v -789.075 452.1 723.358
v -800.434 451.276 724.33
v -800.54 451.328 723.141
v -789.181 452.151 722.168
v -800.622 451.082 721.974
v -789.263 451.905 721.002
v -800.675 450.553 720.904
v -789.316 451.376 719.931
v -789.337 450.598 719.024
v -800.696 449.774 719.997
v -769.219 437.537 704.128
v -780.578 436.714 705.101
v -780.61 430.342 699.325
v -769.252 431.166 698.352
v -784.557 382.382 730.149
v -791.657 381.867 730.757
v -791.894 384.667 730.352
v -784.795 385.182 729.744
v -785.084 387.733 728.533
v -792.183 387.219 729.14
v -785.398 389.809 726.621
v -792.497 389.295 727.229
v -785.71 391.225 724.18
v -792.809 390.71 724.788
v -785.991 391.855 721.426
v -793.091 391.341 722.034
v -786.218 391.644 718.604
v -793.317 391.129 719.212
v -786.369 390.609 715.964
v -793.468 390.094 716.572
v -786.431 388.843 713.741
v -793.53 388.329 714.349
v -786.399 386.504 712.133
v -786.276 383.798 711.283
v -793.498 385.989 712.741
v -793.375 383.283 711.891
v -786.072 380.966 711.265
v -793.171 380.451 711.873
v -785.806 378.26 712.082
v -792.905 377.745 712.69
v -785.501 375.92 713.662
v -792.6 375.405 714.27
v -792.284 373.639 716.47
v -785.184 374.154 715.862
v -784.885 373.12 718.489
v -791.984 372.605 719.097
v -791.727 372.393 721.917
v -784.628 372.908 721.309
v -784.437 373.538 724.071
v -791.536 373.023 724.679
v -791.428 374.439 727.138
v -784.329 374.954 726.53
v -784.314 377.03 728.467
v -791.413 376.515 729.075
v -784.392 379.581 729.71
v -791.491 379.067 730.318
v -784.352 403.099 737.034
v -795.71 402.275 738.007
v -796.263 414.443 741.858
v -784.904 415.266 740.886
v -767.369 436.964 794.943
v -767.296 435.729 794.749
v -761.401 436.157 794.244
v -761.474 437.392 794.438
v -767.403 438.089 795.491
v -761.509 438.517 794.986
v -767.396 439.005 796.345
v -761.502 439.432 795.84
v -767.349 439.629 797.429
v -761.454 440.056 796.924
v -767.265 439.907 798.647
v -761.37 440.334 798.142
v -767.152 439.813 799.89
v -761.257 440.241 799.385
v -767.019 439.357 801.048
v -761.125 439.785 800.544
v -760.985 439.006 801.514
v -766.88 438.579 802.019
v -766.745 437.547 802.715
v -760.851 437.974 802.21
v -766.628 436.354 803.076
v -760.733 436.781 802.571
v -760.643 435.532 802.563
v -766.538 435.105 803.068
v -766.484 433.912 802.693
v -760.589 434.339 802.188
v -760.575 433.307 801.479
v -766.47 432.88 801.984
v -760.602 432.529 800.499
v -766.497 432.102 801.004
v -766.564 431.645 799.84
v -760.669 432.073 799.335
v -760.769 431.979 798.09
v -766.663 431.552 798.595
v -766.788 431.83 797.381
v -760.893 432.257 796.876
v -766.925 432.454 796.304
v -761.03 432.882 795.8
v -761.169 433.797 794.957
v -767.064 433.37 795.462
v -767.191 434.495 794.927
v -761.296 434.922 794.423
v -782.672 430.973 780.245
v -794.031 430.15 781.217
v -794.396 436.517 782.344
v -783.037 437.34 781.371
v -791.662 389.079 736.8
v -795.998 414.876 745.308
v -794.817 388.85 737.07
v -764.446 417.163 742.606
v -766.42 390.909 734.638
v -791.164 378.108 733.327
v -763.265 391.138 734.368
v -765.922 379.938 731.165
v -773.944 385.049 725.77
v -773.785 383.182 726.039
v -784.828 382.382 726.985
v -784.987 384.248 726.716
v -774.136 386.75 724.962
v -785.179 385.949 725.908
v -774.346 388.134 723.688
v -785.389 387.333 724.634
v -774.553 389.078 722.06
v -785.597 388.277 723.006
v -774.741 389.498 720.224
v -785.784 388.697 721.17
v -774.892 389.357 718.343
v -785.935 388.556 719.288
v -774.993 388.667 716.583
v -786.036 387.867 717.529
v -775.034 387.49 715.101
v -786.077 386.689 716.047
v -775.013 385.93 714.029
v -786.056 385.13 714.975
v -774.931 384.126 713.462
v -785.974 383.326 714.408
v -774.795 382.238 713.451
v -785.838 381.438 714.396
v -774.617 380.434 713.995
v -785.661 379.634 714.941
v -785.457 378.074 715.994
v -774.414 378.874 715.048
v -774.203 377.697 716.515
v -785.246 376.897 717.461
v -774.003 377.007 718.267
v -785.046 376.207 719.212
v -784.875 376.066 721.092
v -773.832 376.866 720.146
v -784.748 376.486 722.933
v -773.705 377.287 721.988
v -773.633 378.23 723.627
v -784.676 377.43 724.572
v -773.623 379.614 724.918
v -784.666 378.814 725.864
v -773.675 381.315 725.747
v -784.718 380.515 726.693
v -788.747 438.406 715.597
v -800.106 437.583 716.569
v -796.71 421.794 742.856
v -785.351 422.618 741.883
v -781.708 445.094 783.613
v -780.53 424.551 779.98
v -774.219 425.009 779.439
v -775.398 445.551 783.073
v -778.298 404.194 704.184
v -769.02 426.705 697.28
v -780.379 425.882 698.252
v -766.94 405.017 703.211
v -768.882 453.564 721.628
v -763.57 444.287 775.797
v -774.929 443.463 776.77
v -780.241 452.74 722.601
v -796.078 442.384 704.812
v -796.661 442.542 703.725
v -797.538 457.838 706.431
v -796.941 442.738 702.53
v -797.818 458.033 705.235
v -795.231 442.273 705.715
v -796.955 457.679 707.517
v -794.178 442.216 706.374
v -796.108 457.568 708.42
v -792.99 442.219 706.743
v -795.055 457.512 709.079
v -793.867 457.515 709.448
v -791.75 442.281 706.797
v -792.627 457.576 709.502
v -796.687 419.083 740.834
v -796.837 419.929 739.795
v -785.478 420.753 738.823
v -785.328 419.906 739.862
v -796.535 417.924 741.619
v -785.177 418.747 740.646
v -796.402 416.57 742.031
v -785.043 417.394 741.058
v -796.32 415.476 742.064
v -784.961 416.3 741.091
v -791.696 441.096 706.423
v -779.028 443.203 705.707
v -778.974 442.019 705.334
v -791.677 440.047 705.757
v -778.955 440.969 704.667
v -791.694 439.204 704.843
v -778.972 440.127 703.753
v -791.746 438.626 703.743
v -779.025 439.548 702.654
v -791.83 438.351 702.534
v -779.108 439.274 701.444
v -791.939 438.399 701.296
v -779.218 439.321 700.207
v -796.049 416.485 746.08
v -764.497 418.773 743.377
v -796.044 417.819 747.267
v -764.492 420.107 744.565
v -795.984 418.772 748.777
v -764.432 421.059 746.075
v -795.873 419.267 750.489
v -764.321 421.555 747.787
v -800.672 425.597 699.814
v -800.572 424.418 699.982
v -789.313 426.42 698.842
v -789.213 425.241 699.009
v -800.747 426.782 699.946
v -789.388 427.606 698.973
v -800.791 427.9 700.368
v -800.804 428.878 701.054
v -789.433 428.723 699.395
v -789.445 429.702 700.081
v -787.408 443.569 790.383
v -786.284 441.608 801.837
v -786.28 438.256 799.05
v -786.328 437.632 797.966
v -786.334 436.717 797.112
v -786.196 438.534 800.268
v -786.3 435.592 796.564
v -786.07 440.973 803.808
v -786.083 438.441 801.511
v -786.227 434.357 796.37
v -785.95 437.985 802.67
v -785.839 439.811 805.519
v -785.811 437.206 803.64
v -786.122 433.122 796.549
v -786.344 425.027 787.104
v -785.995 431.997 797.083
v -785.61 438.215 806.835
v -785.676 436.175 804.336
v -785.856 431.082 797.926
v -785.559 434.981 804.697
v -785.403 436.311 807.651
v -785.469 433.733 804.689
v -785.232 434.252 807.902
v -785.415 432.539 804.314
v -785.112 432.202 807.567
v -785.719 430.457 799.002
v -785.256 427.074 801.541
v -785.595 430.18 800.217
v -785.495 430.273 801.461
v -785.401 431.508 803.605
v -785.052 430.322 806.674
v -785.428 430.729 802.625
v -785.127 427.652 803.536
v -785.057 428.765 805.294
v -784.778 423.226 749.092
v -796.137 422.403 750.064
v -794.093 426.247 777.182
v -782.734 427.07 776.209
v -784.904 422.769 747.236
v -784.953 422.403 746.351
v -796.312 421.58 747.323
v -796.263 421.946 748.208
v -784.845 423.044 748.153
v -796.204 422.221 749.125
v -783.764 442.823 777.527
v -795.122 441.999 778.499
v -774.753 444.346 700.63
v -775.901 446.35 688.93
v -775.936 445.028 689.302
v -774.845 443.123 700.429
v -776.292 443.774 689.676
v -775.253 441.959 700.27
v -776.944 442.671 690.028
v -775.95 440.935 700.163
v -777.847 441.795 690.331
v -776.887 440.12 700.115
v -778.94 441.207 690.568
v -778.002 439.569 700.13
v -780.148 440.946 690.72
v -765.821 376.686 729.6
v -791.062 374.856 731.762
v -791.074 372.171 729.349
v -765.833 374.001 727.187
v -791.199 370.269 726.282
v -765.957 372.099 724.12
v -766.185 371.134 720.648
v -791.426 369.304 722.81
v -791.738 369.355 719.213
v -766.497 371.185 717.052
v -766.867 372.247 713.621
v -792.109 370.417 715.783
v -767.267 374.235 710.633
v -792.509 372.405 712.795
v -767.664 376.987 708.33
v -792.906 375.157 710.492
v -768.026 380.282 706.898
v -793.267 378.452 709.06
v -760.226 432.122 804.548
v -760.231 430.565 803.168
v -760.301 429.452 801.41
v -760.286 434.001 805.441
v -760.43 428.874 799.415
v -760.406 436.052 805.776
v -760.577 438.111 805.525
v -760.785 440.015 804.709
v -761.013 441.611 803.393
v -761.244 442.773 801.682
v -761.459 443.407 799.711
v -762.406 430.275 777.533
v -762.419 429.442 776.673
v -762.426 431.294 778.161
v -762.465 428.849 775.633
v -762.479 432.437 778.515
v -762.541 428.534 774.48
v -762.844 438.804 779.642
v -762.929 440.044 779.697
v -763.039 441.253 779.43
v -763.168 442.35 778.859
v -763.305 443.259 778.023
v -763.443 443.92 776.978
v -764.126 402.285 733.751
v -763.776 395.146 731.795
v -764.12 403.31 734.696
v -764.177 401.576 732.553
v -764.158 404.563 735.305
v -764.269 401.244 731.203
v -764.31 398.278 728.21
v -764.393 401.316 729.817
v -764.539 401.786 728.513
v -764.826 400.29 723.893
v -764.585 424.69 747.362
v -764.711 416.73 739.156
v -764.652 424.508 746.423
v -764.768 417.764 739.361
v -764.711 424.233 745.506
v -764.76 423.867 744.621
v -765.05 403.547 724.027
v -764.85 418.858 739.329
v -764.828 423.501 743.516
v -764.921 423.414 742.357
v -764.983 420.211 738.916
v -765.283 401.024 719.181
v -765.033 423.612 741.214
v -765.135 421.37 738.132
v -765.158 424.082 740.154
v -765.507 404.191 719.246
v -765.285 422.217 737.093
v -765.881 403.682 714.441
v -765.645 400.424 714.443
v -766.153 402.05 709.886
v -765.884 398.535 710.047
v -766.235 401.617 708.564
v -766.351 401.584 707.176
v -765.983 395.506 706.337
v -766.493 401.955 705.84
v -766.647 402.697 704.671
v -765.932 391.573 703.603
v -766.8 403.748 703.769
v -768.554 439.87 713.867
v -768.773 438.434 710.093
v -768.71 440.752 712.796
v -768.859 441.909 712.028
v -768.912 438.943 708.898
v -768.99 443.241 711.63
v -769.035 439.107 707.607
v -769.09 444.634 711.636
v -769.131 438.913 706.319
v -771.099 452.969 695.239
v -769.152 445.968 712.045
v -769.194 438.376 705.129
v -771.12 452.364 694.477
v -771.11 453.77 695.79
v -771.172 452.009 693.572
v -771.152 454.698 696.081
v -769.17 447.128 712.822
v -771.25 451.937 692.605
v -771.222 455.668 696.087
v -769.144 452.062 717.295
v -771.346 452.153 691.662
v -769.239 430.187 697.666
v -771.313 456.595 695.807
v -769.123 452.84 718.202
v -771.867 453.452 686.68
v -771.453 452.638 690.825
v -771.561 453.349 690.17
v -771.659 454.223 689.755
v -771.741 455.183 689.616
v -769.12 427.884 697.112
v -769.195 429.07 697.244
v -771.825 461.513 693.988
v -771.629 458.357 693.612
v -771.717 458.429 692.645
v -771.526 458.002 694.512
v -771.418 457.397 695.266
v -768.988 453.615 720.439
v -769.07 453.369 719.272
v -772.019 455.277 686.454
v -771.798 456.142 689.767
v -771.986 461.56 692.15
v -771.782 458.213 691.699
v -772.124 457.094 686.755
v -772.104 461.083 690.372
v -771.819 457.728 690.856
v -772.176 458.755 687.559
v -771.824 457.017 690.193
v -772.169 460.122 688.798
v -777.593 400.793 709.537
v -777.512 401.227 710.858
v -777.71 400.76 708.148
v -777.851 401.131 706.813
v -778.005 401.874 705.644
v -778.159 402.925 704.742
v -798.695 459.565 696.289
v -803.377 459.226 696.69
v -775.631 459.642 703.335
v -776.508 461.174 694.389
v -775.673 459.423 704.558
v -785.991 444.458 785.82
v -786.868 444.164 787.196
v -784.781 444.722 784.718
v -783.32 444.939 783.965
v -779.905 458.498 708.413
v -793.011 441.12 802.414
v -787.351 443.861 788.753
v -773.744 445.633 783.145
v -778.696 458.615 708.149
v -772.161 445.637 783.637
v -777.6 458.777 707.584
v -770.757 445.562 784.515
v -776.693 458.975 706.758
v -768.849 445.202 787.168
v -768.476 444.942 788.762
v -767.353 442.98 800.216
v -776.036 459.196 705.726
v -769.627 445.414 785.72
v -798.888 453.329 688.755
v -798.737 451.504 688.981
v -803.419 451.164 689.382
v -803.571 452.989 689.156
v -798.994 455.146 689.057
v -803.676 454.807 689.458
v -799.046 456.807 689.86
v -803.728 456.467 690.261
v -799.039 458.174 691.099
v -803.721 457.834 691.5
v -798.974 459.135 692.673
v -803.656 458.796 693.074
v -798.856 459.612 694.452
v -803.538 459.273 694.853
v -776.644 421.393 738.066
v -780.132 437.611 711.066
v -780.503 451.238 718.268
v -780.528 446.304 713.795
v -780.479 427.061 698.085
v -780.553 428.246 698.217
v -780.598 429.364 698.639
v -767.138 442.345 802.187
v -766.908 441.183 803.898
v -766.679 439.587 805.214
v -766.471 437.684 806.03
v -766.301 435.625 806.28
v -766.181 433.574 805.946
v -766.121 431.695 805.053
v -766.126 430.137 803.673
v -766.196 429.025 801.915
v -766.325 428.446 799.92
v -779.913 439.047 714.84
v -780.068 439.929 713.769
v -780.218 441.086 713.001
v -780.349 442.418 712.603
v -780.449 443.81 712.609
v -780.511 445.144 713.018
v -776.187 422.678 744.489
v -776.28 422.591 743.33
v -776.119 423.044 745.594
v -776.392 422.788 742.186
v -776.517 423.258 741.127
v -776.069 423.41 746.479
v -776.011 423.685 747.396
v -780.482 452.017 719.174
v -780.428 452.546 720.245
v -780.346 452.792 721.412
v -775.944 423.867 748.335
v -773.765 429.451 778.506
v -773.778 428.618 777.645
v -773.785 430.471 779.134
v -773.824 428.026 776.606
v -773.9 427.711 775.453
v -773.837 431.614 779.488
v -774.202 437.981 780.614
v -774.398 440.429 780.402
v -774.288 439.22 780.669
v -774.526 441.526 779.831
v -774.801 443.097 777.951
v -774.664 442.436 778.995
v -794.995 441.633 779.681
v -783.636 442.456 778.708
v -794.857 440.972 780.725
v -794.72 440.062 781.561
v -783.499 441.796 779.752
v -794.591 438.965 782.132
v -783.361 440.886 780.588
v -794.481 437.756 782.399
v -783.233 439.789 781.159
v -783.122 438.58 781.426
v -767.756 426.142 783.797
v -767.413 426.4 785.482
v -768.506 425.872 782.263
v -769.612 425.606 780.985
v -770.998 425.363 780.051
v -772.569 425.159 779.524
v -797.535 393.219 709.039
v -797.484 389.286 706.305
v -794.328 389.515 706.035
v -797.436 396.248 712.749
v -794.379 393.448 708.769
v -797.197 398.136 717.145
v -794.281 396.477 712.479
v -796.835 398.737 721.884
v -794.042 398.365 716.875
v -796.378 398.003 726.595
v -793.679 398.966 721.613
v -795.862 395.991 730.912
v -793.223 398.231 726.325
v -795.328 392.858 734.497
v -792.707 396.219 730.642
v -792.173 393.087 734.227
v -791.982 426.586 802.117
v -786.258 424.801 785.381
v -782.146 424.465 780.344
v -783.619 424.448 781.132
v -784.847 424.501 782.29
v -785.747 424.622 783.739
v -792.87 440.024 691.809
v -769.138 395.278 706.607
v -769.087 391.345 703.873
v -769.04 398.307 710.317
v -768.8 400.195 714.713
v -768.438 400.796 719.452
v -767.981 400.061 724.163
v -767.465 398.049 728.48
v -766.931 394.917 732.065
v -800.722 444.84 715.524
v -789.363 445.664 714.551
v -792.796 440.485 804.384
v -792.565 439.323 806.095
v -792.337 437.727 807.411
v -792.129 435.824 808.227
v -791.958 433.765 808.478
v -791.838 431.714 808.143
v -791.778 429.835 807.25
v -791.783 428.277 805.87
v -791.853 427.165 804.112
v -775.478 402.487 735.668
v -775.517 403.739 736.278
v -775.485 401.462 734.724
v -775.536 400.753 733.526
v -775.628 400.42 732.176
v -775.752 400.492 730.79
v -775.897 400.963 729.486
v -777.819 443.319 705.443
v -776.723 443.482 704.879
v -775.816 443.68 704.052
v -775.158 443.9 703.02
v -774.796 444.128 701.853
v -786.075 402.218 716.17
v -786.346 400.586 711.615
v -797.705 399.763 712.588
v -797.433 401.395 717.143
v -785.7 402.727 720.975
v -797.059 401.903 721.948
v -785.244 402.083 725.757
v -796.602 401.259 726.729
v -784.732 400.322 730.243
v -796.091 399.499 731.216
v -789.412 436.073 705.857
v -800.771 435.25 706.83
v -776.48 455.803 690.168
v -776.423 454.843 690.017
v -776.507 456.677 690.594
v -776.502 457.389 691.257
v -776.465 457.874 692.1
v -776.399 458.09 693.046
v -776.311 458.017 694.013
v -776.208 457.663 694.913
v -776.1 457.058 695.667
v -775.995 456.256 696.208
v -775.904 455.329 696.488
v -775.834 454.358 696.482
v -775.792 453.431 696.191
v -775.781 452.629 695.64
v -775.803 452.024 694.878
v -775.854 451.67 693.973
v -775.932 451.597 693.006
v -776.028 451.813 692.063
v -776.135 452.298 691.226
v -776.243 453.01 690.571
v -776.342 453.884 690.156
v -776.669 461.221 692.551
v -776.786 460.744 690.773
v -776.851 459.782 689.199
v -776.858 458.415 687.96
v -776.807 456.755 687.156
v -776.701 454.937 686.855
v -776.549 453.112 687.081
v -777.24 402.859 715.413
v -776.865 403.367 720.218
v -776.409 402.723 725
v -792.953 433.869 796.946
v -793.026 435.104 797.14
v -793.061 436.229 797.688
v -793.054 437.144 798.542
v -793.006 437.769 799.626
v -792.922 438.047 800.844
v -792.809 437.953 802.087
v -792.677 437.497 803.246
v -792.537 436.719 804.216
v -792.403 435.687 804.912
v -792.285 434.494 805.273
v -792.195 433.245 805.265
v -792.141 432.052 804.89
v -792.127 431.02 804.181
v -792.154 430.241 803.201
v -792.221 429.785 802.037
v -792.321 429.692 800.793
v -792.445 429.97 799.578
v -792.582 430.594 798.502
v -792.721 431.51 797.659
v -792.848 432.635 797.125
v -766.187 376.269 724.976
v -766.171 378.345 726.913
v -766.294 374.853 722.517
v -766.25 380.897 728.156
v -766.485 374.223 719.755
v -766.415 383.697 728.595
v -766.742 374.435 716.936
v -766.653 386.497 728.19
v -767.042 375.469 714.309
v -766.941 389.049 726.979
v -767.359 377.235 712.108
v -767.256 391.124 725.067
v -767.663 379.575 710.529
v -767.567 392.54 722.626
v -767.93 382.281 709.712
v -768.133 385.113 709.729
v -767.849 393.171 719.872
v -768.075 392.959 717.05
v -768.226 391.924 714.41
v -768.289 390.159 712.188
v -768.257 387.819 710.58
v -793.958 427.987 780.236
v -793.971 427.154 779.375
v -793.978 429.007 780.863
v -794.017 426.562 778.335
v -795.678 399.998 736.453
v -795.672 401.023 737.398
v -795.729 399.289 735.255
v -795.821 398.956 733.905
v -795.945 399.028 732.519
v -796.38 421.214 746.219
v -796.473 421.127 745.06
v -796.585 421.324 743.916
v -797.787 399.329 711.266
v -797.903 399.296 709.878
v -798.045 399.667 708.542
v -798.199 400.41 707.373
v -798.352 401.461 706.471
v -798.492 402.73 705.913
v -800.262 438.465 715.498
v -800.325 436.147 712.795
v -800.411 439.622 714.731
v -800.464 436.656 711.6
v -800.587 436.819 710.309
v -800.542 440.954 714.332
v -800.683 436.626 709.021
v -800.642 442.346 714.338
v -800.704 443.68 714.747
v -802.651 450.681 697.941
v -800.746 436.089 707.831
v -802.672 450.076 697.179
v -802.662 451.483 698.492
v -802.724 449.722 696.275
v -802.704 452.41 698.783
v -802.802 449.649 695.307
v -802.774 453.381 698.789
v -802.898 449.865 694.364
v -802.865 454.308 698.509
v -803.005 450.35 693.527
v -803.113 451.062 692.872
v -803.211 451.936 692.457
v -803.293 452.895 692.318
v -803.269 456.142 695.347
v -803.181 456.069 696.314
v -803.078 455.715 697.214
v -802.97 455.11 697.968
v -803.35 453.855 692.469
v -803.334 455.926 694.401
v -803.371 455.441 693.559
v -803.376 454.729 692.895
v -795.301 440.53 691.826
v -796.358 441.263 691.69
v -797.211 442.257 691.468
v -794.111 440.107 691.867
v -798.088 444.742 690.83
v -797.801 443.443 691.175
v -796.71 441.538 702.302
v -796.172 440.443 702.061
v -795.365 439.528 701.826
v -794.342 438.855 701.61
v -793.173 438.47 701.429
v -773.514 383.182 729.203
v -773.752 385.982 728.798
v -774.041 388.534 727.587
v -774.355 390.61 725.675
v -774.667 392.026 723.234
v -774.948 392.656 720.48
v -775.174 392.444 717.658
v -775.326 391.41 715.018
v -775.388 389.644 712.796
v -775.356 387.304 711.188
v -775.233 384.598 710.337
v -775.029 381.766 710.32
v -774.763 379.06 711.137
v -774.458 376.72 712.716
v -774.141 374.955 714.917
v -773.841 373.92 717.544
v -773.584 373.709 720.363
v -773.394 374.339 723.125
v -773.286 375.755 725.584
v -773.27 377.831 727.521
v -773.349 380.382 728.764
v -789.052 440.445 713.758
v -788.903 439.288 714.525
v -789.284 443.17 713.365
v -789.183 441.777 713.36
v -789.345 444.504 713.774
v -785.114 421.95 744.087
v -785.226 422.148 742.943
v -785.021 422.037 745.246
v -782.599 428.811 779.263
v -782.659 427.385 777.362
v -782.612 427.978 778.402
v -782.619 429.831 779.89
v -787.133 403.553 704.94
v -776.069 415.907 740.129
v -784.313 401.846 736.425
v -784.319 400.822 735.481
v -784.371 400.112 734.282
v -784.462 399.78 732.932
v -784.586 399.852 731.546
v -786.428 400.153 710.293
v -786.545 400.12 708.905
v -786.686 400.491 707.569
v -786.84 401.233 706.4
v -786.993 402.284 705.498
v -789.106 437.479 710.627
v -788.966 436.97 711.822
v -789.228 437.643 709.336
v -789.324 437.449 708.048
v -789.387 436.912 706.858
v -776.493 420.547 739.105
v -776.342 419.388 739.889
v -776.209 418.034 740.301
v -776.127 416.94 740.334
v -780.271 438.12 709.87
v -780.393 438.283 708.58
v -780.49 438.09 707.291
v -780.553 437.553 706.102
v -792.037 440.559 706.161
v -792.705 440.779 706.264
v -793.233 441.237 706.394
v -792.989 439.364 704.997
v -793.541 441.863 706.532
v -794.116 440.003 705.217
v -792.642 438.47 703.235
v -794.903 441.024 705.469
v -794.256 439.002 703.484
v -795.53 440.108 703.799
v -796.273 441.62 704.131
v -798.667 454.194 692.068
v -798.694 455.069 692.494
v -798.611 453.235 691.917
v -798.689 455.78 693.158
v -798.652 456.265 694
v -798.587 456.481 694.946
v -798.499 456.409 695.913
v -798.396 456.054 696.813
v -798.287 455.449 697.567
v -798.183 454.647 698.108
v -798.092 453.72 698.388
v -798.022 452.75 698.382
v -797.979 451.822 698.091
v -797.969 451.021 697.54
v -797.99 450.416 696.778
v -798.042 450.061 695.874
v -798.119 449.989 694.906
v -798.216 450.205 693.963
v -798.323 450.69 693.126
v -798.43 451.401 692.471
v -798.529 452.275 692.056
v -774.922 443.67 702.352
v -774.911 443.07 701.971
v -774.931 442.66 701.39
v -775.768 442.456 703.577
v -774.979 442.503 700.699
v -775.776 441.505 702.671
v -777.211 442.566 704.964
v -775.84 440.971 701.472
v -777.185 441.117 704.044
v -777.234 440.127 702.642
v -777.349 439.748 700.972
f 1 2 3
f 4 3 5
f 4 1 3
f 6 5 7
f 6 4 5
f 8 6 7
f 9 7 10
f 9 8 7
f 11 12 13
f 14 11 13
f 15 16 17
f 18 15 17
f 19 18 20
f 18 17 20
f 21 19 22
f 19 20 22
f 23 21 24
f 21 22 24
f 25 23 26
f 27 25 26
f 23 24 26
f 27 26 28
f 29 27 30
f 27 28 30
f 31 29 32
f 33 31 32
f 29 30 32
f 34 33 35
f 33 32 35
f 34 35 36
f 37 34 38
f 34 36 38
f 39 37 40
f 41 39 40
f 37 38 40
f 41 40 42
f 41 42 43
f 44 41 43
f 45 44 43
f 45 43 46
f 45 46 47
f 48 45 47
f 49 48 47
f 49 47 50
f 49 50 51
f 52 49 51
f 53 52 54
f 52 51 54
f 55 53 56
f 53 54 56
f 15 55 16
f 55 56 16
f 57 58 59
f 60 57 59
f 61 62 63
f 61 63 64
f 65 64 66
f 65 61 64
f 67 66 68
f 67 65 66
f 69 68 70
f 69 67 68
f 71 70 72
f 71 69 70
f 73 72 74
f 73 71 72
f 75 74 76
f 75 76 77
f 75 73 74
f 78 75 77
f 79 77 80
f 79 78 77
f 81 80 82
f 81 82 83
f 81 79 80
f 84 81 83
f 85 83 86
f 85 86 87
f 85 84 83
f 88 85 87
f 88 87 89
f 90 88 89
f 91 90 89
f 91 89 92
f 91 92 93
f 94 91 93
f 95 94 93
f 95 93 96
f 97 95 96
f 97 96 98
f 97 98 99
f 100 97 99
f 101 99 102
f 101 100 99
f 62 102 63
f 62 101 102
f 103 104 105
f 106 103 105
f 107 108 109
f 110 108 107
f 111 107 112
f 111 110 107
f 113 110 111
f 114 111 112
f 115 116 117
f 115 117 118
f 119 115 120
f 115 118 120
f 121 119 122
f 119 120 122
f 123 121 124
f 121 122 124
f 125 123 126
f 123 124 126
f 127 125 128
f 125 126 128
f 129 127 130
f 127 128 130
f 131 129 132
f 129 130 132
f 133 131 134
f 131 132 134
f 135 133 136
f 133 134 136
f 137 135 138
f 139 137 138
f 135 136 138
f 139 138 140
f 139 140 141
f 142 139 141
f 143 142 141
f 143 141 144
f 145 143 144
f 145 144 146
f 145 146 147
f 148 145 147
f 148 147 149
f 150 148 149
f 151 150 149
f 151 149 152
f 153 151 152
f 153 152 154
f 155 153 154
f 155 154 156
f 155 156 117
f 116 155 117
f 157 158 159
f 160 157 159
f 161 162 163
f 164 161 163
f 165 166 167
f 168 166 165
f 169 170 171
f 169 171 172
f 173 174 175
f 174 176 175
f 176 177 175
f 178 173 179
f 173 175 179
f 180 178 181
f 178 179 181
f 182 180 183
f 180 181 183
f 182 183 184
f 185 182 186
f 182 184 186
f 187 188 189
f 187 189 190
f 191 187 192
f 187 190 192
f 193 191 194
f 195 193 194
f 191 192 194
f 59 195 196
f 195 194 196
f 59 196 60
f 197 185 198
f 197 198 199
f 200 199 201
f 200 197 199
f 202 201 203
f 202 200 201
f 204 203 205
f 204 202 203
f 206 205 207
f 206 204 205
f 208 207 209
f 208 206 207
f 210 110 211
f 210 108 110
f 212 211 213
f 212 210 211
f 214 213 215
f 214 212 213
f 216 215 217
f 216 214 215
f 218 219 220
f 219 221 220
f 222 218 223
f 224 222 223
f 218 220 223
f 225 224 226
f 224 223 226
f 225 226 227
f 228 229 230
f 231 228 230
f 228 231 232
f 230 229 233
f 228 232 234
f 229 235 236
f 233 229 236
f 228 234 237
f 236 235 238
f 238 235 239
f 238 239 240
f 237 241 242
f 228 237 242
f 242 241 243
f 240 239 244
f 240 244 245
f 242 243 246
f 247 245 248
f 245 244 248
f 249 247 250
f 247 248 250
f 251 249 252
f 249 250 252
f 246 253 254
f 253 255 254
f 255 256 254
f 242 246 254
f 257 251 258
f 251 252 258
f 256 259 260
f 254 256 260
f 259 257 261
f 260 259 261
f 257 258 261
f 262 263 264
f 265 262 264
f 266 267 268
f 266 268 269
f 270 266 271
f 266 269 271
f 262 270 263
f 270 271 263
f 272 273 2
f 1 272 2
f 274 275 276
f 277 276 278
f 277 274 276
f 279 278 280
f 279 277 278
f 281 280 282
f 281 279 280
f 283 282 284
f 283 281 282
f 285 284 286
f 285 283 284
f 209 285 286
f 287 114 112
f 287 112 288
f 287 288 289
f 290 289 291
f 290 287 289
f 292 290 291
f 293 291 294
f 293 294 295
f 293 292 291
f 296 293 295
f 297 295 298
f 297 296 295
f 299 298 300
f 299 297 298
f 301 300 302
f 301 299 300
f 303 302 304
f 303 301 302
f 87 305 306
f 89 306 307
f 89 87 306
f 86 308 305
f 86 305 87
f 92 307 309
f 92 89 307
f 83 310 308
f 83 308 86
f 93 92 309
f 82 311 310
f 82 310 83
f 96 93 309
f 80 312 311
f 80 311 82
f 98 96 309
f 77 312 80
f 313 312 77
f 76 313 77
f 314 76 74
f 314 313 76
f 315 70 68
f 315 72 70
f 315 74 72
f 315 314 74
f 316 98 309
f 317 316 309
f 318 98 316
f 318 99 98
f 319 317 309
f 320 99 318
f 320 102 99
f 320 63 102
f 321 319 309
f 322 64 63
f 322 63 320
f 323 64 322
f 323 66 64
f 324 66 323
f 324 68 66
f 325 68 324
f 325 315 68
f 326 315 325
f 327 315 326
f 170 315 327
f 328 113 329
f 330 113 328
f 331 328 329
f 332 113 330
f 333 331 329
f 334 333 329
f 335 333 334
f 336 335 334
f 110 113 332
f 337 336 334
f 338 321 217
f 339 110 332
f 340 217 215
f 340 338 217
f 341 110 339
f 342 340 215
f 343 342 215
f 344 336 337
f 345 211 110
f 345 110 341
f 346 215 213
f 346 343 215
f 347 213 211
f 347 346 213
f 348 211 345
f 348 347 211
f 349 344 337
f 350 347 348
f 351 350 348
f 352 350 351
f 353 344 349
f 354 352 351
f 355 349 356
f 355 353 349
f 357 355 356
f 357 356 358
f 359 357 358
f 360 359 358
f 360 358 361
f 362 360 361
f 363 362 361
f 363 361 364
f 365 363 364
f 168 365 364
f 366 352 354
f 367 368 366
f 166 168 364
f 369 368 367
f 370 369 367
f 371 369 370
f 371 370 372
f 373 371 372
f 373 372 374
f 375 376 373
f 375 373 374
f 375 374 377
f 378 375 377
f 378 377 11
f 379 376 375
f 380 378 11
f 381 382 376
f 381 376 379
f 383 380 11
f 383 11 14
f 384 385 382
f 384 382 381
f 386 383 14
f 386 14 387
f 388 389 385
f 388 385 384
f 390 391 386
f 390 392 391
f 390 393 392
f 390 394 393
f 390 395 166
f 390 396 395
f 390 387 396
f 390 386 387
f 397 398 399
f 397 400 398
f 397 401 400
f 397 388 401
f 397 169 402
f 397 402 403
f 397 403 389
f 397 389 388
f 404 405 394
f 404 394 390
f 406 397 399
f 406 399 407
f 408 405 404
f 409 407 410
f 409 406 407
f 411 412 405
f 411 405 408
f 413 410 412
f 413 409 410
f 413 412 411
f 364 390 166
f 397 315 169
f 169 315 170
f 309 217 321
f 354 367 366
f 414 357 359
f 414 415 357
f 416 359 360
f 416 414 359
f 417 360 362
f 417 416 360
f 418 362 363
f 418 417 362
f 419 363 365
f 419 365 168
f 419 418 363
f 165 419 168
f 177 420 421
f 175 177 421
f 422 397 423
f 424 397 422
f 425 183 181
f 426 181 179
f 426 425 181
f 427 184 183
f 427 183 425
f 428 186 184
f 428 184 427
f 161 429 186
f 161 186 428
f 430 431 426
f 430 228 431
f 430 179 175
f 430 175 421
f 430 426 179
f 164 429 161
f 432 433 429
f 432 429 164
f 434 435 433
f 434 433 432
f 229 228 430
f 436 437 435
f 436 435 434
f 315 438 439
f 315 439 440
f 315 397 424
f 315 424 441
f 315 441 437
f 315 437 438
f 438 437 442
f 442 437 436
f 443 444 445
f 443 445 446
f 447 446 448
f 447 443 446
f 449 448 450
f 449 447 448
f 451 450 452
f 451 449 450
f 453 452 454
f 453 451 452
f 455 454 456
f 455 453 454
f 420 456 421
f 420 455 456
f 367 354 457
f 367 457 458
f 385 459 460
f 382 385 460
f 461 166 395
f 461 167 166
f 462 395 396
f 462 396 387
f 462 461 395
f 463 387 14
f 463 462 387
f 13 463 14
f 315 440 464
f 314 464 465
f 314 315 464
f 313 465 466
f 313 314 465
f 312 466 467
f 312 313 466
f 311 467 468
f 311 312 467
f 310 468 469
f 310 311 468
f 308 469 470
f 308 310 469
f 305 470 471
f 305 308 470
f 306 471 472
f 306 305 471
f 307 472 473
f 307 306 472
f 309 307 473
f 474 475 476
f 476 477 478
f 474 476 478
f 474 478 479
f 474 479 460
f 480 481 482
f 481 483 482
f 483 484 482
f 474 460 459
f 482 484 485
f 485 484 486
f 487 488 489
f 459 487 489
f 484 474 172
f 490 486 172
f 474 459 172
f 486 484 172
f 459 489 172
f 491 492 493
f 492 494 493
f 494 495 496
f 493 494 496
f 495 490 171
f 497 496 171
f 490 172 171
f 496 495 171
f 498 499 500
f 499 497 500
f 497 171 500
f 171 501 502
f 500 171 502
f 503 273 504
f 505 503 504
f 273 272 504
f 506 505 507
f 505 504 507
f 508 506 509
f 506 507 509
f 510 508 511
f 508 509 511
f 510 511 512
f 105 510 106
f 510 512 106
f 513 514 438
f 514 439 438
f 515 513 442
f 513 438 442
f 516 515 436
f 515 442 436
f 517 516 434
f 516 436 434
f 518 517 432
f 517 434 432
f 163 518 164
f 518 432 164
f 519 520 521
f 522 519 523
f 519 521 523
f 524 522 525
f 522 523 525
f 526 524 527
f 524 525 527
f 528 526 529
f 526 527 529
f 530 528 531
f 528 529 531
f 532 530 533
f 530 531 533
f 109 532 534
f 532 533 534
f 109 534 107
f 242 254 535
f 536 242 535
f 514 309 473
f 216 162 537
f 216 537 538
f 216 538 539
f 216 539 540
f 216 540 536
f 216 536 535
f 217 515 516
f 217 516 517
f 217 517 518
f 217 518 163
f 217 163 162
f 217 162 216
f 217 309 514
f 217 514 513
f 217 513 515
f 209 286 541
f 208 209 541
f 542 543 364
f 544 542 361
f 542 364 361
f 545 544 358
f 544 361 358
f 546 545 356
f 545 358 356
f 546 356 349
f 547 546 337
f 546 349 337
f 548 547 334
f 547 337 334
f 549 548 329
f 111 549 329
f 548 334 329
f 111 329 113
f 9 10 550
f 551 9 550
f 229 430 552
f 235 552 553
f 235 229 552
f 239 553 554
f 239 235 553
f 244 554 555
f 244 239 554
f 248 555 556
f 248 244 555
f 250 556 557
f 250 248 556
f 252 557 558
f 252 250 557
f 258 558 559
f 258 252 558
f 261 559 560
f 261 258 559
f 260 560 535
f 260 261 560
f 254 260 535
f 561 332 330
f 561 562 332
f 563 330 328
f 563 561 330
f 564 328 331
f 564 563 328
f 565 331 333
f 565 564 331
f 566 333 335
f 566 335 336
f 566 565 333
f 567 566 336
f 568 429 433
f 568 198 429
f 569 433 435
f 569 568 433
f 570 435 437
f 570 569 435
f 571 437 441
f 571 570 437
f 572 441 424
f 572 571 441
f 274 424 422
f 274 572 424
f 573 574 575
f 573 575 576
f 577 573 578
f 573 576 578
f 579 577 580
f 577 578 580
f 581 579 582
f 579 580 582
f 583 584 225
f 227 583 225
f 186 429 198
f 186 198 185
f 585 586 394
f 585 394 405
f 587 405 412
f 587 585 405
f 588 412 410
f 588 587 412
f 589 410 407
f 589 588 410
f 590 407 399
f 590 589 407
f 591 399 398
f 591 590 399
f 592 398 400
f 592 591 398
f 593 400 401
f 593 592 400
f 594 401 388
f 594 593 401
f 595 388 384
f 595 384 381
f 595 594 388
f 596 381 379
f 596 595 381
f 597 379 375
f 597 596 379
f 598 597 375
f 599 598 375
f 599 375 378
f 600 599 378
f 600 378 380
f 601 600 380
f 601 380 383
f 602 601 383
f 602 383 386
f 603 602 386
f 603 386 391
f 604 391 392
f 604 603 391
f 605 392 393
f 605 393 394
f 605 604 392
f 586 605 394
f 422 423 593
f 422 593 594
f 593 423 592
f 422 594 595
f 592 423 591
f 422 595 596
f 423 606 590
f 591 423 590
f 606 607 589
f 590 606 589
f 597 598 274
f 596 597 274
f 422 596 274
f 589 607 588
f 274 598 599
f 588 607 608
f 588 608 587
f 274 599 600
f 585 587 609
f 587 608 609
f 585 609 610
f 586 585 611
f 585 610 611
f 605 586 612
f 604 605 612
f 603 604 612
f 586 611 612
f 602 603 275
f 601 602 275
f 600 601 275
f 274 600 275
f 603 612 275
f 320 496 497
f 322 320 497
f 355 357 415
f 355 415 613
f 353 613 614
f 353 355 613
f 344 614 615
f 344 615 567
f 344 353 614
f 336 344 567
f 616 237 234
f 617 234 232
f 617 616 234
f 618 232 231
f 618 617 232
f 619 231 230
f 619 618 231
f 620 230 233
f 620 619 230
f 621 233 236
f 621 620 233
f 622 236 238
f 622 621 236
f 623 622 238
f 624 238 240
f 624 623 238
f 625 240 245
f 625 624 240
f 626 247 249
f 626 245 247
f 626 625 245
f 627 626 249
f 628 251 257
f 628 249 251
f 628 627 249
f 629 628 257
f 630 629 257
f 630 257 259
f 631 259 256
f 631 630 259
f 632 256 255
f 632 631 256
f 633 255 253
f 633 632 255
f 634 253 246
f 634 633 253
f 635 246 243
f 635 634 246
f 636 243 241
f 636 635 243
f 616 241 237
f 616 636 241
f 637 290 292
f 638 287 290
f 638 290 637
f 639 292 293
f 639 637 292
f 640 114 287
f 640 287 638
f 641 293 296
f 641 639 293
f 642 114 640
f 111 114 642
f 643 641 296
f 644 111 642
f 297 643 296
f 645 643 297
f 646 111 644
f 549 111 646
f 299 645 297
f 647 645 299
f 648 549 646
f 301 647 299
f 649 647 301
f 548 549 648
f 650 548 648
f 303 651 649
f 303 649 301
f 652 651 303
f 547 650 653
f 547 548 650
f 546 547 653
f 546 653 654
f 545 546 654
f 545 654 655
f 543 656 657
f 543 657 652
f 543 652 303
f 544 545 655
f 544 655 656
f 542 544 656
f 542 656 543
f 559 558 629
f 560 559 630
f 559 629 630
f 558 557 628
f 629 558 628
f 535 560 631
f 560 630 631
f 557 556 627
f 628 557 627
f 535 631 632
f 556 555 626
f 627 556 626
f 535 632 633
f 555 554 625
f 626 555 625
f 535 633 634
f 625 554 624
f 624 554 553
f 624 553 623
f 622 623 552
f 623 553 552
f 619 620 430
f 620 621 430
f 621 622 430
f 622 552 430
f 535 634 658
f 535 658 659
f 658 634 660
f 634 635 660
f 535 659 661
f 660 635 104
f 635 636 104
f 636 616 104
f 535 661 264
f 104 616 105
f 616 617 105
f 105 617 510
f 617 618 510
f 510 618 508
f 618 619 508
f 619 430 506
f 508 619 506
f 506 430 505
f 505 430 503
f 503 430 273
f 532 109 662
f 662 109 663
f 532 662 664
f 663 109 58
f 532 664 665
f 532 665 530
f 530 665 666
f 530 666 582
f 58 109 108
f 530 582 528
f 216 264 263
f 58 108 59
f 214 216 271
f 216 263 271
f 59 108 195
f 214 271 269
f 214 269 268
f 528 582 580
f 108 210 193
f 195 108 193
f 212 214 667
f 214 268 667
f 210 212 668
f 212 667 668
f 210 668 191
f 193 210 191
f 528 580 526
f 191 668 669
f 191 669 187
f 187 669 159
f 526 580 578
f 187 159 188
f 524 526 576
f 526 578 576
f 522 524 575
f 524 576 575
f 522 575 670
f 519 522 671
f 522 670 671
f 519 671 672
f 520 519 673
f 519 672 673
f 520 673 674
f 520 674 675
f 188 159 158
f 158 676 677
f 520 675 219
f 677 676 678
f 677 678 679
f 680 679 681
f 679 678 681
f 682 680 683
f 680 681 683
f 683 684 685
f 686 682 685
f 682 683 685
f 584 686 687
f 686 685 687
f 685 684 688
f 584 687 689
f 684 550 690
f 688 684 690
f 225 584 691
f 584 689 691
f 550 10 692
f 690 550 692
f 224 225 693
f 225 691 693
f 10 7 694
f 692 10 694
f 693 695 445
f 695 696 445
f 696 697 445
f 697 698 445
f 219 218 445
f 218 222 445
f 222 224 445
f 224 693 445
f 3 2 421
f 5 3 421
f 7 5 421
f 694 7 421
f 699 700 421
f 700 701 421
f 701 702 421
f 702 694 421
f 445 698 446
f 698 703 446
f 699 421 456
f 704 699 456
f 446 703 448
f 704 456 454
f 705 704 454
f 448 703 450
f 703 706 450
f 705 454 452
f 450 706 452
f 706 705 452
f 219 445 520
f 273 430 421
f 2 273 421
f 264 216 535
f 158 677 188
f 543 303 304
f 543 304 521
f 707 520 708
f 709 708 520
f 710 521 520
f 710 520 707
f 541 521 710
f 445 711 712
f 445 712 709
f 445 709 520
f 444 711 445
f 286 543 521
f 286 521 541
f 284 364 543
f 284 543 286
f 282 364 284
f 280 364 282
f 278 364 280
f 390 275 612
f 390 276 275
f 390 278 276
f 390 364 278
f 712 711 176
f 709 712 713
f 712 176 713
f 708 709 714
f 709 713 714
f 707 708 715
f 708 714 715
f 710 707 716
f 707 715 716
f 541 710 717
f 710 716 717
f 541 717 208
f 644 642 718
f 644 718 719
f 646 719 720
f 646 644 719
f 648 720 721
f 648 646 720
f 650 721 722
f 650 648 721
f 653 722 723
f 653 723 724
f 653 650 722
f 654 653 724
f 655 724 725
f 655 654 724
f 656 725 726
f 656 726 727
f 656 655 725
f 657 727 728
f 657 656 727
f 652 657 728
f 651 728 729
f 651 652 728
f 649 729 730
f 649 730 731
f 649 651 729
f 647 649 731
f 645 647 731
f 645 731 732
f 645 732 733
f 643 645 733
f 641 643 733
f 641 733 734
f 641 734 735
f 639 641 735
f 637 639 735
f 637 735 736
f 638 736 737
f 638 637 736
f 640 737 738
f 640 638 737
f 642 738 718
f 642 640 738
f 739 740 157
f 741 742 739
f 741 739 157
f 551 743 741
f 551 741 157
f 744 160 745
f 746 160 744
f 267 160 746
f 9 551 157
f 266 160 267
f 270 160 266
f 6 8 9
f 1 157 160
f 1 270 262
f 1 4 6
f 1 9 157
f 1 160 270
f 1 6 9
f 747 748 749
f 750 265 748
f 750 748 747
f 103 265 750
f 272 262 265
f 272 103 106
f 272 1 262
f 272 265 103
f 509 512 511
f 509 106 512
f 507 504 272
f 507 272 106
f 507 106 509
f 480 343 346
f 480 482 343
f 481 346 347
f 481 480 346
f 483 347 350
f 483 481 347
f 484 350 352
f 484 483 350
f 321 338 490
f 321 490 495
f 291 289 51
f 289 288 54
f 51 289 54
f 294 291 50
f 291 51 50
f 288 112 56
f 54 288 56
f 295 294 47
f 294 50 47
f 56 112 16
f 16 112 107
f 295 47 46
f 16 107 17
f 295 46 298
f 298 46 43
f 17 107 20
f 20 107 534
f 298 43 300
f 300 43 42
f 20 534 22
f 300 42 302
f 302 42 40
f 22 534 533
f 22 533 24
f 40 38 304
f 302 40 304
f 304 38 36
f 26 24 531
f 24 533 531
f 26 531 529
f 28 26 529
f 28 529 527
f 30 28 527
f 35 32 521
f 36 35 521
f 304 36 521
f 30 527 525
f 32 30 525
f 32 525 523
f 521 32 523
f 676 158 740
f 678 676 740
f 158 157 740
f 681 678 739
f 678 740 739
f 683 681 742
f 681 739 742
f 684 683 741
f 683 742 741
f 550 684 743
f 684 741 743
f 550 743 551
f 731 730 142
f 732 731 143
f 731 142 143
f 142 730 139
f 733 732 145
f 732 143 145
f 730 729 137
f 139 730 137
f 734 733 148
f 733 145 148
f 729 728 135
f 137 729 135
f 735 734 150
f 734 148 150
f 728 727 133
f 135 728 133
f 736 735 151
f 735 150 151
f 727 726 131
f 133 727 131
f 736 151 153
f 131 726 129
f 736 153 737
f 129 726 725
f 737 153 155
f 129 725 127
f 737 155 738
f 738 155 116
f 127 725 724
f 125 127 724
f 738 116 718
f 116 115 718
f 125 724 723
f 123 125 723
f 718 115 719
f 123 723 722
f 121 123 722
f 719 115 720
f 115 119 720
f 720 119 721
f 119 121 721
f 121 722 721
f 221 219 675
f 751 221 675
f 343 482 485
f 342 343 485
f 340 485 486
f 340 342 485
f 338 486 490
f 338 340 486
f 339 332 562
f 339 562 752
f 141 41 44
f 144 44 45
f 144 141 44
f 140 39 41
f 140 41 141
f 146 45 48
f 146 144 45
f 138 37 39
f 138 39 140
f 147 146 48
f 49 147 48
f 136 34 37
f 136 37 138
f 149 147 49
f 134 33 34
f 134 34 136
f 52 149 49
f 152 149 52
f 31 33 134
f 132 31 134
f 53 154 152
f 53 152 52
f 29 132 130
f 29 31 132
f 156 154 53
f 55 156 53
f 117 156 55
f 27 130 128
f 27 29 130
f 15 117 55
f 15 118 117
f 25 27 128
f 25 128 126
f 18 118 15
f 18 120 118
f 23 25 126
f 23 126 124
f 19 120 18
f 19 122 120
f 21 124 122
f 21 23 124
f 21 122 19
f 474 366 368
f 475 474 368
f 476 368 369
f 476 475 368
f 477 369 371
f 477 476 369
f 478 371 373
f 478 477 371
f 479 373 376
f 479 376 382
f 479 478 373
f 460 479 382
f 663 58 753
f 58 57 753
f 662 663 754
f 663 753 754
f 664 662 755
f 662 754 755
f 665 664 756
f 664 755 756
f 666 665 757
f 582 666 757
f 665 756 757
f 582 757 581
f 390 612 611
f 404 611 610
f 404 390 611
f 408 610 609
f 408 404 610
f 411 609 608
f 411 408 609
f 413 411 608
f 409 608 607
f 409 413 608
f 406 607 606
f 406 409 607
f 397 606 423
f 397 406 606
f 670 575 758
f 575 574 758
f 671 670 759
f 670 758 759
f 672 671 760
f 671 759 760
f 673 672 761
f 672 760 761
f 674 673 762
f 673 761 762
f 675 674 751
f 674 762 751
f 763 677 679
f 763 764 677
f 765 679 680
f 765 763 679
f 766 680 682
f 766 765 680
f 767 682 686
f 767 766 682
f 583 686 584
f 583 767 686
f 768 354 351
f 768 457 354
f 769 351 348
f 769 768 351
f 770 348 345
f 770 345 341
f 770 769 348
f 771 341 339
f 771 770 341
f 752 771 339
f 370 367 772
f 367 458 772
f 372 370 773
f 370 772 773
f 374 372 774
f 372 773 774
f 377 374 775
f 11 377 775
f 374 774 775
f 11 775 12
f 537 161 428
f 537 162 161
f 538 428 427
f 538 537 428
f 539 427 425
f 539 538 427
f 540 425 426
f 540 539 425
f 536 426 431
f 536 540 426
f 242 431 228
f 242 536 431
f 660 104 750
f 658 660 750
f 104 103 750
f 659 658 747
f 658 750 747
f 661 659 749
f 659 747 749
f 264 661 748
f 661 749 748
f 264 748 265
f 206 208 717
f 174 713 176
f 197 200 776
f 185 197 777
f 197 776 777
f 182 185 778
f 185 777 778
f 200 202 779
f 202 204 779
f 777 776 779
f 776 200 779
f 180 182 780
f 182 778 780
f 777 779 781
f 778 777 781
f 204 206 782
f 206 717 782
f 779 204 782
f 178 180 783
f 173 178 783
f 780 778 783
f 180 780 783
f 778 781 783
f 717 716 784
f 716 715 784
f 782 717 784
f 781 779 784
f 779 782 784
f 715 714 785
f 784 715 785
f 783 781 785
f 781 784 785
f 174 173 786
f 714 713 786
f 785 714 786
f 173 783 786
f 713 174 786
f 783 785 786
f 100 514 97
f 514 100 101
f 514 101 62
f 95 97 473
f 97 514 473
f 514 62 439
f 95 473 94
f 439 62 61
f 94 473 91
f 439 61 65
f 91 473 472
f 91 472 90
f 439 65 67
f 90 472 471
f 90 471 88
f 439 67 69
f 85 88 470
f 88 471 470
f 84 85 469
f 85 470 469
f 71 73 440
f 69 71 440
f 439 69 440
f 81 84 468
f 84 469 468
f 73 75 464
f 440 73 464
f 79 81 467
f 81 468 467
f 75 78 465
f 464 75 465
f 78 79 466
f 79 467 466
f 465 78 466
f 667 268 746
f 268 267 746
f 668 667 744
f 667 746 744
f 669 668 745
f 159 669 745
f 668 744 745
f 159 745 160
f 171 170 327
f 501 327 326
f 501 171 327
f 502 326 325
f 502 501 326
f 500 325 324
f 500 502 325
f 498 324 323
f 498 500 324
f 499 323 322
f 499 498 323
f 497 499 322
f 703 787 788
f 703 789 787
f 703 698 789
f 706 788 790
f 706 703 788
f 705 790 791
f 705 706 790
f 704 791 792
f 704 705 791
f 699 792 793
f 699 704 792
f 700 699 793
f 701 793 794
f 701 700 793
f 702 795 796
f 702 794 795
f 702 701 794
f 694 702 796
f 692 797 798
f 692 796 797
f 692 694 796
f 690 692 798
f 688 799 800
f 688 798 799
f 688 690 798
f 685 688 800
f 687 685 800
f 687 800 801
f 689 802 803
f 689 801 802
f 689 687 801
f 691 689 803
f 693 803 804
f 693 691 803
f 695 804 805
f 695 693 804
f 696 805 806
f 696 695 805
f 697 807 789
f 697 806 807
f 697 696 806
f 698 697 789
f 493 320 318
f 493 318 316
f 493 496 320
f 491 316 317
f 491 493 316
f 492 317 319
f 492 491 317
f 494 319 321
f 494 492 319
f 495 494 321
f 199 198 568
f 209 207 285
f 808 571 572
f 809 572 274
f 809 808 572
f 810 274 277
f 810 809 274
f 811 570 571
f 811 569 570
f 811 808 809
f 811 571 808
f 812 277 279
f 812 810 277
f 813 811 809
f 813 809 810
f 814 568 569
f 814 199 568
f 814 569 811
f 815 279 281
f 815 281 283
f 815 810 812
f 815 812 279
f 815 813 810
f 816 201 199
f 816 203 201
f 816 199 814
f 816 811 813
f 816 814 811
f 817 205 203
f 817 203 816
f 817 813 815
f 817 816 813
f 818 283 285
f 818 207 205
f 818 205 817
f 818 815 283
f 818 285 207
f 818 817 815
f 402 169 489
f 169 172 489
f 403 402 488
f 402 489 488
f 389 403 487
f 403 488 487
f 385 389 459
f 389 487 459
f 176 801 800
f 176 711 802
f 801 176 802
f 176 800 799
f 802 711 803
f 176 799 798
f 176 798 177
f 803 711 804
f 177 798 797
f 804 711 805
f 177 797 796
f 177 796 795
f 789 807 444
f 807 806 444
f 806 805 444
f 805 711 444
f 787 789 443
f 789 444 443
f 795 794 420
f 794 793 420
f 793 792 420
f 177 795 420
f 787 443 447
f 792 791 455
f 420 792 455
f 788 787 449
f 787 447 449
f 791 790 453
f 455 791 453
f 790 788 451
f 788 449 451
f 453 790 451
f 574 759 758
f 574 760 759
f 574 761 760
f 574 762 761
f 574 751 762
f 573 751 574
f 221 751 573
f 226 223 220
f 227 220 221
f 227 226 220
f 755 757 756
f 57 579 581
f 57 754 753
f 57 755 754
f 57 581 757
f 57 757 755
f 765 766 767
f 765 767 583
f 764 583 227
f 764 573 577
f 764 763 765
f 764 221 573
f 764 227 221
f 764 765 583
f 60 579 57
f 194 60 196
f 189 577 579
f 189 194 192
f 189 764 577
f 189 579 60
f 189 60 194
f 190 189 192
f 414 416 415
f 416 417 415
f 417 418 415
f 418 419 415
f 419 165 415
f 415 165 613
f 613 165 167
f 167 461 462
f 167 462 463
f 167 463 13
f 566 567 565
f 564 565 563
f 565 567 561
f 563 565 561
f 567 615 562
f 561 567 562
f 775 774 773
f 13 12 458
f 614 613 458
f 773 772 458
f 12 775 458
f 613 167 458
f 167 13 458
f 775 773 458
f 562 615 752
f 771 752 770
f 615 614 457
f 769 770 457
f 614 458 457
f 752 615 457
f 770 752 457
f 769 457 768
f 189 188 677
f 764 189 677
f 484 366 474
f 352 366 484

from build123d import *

# Parameters (mm, degrees)
SKETCH1_R               = 3.263900000000121
SKETCH1_R_2             = 4.199999999999976
BOSS_EXTRUDE1_DEPTH     = 15.875
FILLET7_R               = 6.35
CUT_EXTRUDE6_DEPTH      = 25.4
FILLET8_R               = 6.35
CUT_EXTRUDE8_DEPTH      = 20.32
CUT_EXTRUDE9_DEPTH      = 906.5663752758251
CUT_EXTRUDE9_DEPTH_BACK = 3.175
CUT_EXTRUDE10_DEPTH     = 11.43
SKETCH29_R              = 6.349999999999941
CUT_EXTRUDE11_DEPTH     = 906.4543212392226
SKETCH30_R              = 9.525000000000018
CUT_EXTRUDE12_DEPTH     = 7.14375
FILLET10_R              = 4.7625
FILLET10_OF_MIRROR9_R   = 4.7625
SKETCH33_R              = 17.144999999999648
CUT_EXTRUDE14_DEPTH     = 3.175
FILLET11_R              = 4.7625


with BuildPart() as part:
    # Sketch1 → Boss-Extrude1 (new, symmetric)
    with BuildSketch(Plane(origin=(-803.6566332789141, -58.26345281012812, 68.82567852426239), x_dir=(-0.08515417095162939, -0.00241614660156225, -0.9963648575723355), z_dir=(0.9937636896807375, 0.07204582335356381, -0.08510657089457987))):
        with BuildLine():
            ThreePointArc((-664.2038450226969, 436.8184776127322), (-651.8745198787159, 427.9178662715624), (-639.8468613838354, 437.2220896073974))
            Line((-639.8468613838348, 437.2220896073972), (-619.5515204929051, 510.40226291213133))
            ThreePointArc((-619.5515204929051, 510.40226291213133), (-620.9838530756886, 516.4455246988489), (-626.8562553144544, 518.4672768094307))
            Line((-626.8562553144544, 518.4672768094307), (-733.0342996841451, 500.0570320892499))
            ThreePointArc((-733.0342996841451, 500.05703208924996), (-739.1483230926673, 492.6676503574812), (-732.7916358037484, 485.48595339028384))
            Line((-732.7916358037484, 485.4859533902838), (-677.0205822251494, 477.71877799538424))
            Line((-677.0205822251494, 477.71877799538424), (-664.2038450226976, 436.81847761273195))
        make_face()
        with Locations(Location((-625.7562257117465, 512.1230378414245, 0), (0, 0, 0.138795824))):
            Circle(SKETCH1_R, mode=Mode.SUBTRACT)
        with Locations(Location((-731.7743456050367, 492.79045512904787, 0), (0, 0, 0.138795824))):
            Circle(SKETCH1_R_2, mode=Mode.SUBTRACT)
    extrude(amount=BOSS_EXTRUDE1_DEPTH, both=True)

    # Fillet7
    fillet7_edges = [part.edges().sort_by_distance(p)[0] for p in [
        (-780.3962698306742, 419.8482713749311, 745.1689599242694),
    ]]
    fillet(fillet7_edges, radius=FILLET7_R)

    # Sketch23 → Cut-Extrude6 (cut)
    with BuildSketch(Plane(origin=(61.972947811989165, -108.2363846344534, 632.0133130126799), x_dir=(0.9953619214294605, 0.016238085990304504, -0.09482072522199067), z_dir=(0.09620106739496219, -0.16801614414720037, 0.9810789621319872))):
        Polygon((-851.4974580179244, 570.6197226277428), (-849.4828619685262, 535.112578894877), (-830.4634507696352, 536.1916978167321), (-832.4780468190336, 571.698841549598), align=None)
    extrude(amount=-CUT_EXTRUDE6_DEPTH, mode=Mode.SUBTRACT)

    # Fillet8
    fillet8_edges = [part.edges().sort_by_distance(p)[0] for p in [
        (-768.4981336258412, 435.7374633830816, 780.7155057686616),
        (-787.4293319142591, 434.3649904481962, 782.3367859442033),
    ]]
    fillet(fillet8_edges, radius=FILLET8_R)

    # Sketch26 → Cut-Extrude8 (cut)
    with BuildSketch(Plane(origin=(50.277187193507835, -87.80961957666034, 512.7374567291475), x_dir=(-0.9953619214296225, -0.01623864853432569, 0.09482062888268945), z_dir=(-0.0962010673949623, 0.16801614414720273, -0.9810789621319869))):
        Polygon((831.6096354550859, 577.9339524783938), (830.1087716603103, 551.4810443146557), (852.3995223072293, 550.2163296603253), (853.9003861020049, 576.6692378240637), align=None)
    extrude(amount=-CUT_EXTRUDE8_DEPTH, mode=Mode.SUBTRACT)

    # Sketch27 → Cut-Extrude9 (cut, two sides: drawn at the far end of the back side and taken through both)
    with BuildSketch(Plane(origin=(-819.4326318525958, -59.40718025586634, 70.17674533721406), x_dir=(0.08488379068765259, 0.006153900220914947, 0.9963718540738522), z_dir=(-0.9937636896807374, -0.07204582335356426, 0.08510657089458012)).offset(-CUT_EXTRUDE9_DEPTH_BACK)):
        with BuildLine():
            Line((519.6219025840122, 211.91880941976535), (638.4443725730704, 445.9315686732567))
            ThreePointArc((638.4443725730704, 445.9315686732567), (654.0798834896251, 455.31078922151056), (669.3214837157453, 445.3041613048935))
            Line((669.3214837157453, 445.3041613048935), (778.5397566596026, 206.65772885116039))
            Line((778.5397566596026, 206.65772885116039), (767.8761958936219, -318.1367946937436))
            Line((767.8761958936219, -318.1367946937436), (508.95834181803144, -312.87571412513864))
            Line((508.95834181803144, -312.87571412513864), (519.6219025840122, 211.91880941976535))
        make_face()
    extrude(amount=CUT_EXTRUDE9_DEPTH + CUT_EXTRUDE9_DEPTH_BACK, mode=Mode.SUBTRACT)

    # Sketch28 → Cut-Extrude10 (cut)
    with BuildSketch(Plane(origin=(-819.4326318525959, -59.40718025586635, 70.17674533721406), x_dir=(0.08488379068765257, 0.006153900220914946, 0.9963718540738522), z_dir=(-0.9937636896807375, -0.07204582335356424, 0.08510657089458012))):
        with BuildLine():
            Line((641.610435680991, 494.9044603779857), (631.4071387526498, 483.7236998843152))
            Line((631.4071387526498, 483.7236998843152), (639.8115098751724, 452.97250675062605))
            ThreePointArc((639.8115098751724, 452.97250675062605), (654.1443845784224, 458.48513397429696), (668.241493429274, 452.3948237840471))
            Line((668.2414934292741, 452.39482378404716), (674.5635114397776, 472.307585723845))
            ThreePointArc((674.5635114397776, 472.307585723845), (674.9689897543286, 473.36298990652836), (675.4966669350005, 474.3629136263164))
            Line((675.4966669350005, 474.3629136263164), (641.6104356809909, 494.90446037798574))
        make_face()
        with BuildLine():
            Line((653.9539402363619, 508.43045781346063), (643.7918856391113, 497.29489061656125))
            Line((643.7918856391113, 497.2948906165613), (677.6083716229516, 476.79562285771186))
            ThreePointArc((677.6083716229516, 476.79562285771186), (679.842443438827, 478.15968717889757), (682.3634605019174, 478.8641169613652))
            Line((682.3634605019174, 478.8641169613652), (713.0233309253331, 483.01701779228154))
            Line((713.0233309253331, 483.0170177922816), (715.5913760089414, 497.50503494976147))
            Line((715.5913760089414, 497.50503494976147), (653.9539402363619, 508.4304578134607))
        make_face()
    cut_extrude10 = extrude(amount=-CUT_EXTRUDE10_DEPTH, mode=Mode.SUBTRACT)

    # Sketch29 → Cut-Extrude11 (cut, through all)
    with BuildSketch(Plane(origin=(-816.2774321378597, -59.1784347667188, 69.90653197462377), x_dir=(0.08488379068765259, 0.006153900220914947, 0.9963718540738522), z_dir=(-0.9937636896807374, -0.07204582335356423, 0.08510657089458012))):
        with Locations(Location((653.7315776101187, 438.16932755646275, 0), (0, 0, 359.646486586))):
            Circle(SKETCH29_R)
    extrude(amount=-CUT_EXTRUDE11_DEPTH, mode=Mode.SUBTRACT)

    # Sketch30 → Cut-Extrude12 (cut)
    with BuildSketch(Plane(origin=(-816.2774321378599, -59.178434766718816, 69.90653197462377), x_dir=(0.08488379068765257, 0.006153900220914946, 0.9963718540738522), z_dir=(-0.9937636896807375, -0.07204582335356424, 0.08510657089458012))):
        with Locations(Location((653.7315776101187, 438.16932755646275, 0), (0, 0, 359.646486586))):
            Circle(SKETCH30_R)
    cut_extrude12 = extrude(amount=-CUT_EXTRUDE12_DEPTH, mode=Mode.SUBTRACT)

    # Fillet10
    fillet10_edges = [part.edges().sort_by_distance(p)[0] for p in [
        (-788.1552248280682, 427.1450787260482, 780.1267395165396),
        (-788.9848414044336, 441.61097464981503, 782.6854673578397),
        (-795.0068579123044, 452.1284878234392, 721.2716611967566),
        (-795.0642591647301, 440.95953350372866, 711.1464760164944),
        (-790.7115231509628, 420.72202917254344, 744.8402708544758),
        (-789.7422422016995, 396.3274603010962, 735.5073770617572),
        (-792.1972581719219, 396.7286758070525, 707.180541636668),
        (-790.7148679020396, 418.2826927308667, 742.7362277392854),
        (-795.0765812752346, 438.5619361773402, 708.9729406771527),
        (-795.1342154885674, 427.347653060428, 698.8066627989953),
    ]]
    fillet(fillet10_edges, radius=FILLET10_R)

    # Mirror9: Cut-Extrude10, Cut-Extrude12 across plane
    add(cut_extrude10.mirror(Plane(origin=(-803.6566332789141, -58.26345281012812, 68.82567852426239), x_dir=(0.08488379068765235, 0.00615390022091489, 0.9963718540738523), z_dir=(0.9937636896807375, 0.07204582335356381, -0.08510657089457987))), mode=Mode.SUBTRACT)
    add(cut_extrude12.mirror(Plane(origin=(-803.6566332789141, -58.26345281012812, 68.82567852426239), x_dir=(0.08488379068765235, 0.00615390022091489, 0.9963718540738523), z_dir=(0.9937636896807375, 0.07204582335356381, -0.08510657089457987))), mode=Mode.SUBTRACT)

    # Fillet10 of Mirror9
    fillet10_of_mirror9_edges = [part.edges().sort_by_distance(p)[0] for p in [
        (-767.9619466537554, 428.60904985659255, 778.3973739959619),
        (-768.7915632301208, 443.0749457803594, 780.9561018372618),
        (-774.8135797379914, 453.59245895398357, 719.5422956761787),
        (-774.870980990417, 442.4235046342731, 709.4171104959165),
        (-770.5182449766497, 422.18600030308784, 743.1109053338979),
        (-769.5489640273865, 397.79143143164066, 733.7780115411794),
        (-772.0039799976088, 398.192646937597, 705.4511761160901),
        (-770.5215897277267, 419.74666386141104, 741.0068622187075),
        (-774.8833031009216, 440.02590730788467, 707.2435751565748),
        (-774.9409373142544, 428.8116241909724, 697.0772972784174),
    ]]
    fillet(fillet10_of_mirror9_edges, radius=FILLET10_OF_MIRROR9_R)

    # Sketch33 → Cut-Extrude14 (cut)
    with BuildSketch(Plane(origin=(-787.8806347052326, -57.119725364390696, 67.47461171131114), x_dir=(-0.08488379068765259, -0.006153900220914947, -0.9963718540738522), z_dir=(0.9937636896807374, 0.07204582335356423, -0.08510657089458012))):
        with Locations((-653.7315776101188, 438.1693275564627)):
            Circle(SKETCH33_R)
    extrude(amount=-CUT_EXTRUDE14_DEPTH, mode=Mode.SUBTRACT)

    # Fillet11
    fillet11_edges = [part.edges().sort_by_distance(p)[0] for p in [
        (-796.9082546128618, 438.46793345177383, 699.2942172907788),
        (-785.1203512694295, 438.0597382877858, 705.4239621272485),
        (-796.7868884418211, 447.2442527490892, 708.1408484710828),
        (-774.5995240477952, 448.852791028775, 706.240708105348),
        (-774.720890218836, 440.07647173145955, 697.3940769250439),
    ]]
    fillet(fillet11_edges, radius=FILLET11_R)


solid = part.part
